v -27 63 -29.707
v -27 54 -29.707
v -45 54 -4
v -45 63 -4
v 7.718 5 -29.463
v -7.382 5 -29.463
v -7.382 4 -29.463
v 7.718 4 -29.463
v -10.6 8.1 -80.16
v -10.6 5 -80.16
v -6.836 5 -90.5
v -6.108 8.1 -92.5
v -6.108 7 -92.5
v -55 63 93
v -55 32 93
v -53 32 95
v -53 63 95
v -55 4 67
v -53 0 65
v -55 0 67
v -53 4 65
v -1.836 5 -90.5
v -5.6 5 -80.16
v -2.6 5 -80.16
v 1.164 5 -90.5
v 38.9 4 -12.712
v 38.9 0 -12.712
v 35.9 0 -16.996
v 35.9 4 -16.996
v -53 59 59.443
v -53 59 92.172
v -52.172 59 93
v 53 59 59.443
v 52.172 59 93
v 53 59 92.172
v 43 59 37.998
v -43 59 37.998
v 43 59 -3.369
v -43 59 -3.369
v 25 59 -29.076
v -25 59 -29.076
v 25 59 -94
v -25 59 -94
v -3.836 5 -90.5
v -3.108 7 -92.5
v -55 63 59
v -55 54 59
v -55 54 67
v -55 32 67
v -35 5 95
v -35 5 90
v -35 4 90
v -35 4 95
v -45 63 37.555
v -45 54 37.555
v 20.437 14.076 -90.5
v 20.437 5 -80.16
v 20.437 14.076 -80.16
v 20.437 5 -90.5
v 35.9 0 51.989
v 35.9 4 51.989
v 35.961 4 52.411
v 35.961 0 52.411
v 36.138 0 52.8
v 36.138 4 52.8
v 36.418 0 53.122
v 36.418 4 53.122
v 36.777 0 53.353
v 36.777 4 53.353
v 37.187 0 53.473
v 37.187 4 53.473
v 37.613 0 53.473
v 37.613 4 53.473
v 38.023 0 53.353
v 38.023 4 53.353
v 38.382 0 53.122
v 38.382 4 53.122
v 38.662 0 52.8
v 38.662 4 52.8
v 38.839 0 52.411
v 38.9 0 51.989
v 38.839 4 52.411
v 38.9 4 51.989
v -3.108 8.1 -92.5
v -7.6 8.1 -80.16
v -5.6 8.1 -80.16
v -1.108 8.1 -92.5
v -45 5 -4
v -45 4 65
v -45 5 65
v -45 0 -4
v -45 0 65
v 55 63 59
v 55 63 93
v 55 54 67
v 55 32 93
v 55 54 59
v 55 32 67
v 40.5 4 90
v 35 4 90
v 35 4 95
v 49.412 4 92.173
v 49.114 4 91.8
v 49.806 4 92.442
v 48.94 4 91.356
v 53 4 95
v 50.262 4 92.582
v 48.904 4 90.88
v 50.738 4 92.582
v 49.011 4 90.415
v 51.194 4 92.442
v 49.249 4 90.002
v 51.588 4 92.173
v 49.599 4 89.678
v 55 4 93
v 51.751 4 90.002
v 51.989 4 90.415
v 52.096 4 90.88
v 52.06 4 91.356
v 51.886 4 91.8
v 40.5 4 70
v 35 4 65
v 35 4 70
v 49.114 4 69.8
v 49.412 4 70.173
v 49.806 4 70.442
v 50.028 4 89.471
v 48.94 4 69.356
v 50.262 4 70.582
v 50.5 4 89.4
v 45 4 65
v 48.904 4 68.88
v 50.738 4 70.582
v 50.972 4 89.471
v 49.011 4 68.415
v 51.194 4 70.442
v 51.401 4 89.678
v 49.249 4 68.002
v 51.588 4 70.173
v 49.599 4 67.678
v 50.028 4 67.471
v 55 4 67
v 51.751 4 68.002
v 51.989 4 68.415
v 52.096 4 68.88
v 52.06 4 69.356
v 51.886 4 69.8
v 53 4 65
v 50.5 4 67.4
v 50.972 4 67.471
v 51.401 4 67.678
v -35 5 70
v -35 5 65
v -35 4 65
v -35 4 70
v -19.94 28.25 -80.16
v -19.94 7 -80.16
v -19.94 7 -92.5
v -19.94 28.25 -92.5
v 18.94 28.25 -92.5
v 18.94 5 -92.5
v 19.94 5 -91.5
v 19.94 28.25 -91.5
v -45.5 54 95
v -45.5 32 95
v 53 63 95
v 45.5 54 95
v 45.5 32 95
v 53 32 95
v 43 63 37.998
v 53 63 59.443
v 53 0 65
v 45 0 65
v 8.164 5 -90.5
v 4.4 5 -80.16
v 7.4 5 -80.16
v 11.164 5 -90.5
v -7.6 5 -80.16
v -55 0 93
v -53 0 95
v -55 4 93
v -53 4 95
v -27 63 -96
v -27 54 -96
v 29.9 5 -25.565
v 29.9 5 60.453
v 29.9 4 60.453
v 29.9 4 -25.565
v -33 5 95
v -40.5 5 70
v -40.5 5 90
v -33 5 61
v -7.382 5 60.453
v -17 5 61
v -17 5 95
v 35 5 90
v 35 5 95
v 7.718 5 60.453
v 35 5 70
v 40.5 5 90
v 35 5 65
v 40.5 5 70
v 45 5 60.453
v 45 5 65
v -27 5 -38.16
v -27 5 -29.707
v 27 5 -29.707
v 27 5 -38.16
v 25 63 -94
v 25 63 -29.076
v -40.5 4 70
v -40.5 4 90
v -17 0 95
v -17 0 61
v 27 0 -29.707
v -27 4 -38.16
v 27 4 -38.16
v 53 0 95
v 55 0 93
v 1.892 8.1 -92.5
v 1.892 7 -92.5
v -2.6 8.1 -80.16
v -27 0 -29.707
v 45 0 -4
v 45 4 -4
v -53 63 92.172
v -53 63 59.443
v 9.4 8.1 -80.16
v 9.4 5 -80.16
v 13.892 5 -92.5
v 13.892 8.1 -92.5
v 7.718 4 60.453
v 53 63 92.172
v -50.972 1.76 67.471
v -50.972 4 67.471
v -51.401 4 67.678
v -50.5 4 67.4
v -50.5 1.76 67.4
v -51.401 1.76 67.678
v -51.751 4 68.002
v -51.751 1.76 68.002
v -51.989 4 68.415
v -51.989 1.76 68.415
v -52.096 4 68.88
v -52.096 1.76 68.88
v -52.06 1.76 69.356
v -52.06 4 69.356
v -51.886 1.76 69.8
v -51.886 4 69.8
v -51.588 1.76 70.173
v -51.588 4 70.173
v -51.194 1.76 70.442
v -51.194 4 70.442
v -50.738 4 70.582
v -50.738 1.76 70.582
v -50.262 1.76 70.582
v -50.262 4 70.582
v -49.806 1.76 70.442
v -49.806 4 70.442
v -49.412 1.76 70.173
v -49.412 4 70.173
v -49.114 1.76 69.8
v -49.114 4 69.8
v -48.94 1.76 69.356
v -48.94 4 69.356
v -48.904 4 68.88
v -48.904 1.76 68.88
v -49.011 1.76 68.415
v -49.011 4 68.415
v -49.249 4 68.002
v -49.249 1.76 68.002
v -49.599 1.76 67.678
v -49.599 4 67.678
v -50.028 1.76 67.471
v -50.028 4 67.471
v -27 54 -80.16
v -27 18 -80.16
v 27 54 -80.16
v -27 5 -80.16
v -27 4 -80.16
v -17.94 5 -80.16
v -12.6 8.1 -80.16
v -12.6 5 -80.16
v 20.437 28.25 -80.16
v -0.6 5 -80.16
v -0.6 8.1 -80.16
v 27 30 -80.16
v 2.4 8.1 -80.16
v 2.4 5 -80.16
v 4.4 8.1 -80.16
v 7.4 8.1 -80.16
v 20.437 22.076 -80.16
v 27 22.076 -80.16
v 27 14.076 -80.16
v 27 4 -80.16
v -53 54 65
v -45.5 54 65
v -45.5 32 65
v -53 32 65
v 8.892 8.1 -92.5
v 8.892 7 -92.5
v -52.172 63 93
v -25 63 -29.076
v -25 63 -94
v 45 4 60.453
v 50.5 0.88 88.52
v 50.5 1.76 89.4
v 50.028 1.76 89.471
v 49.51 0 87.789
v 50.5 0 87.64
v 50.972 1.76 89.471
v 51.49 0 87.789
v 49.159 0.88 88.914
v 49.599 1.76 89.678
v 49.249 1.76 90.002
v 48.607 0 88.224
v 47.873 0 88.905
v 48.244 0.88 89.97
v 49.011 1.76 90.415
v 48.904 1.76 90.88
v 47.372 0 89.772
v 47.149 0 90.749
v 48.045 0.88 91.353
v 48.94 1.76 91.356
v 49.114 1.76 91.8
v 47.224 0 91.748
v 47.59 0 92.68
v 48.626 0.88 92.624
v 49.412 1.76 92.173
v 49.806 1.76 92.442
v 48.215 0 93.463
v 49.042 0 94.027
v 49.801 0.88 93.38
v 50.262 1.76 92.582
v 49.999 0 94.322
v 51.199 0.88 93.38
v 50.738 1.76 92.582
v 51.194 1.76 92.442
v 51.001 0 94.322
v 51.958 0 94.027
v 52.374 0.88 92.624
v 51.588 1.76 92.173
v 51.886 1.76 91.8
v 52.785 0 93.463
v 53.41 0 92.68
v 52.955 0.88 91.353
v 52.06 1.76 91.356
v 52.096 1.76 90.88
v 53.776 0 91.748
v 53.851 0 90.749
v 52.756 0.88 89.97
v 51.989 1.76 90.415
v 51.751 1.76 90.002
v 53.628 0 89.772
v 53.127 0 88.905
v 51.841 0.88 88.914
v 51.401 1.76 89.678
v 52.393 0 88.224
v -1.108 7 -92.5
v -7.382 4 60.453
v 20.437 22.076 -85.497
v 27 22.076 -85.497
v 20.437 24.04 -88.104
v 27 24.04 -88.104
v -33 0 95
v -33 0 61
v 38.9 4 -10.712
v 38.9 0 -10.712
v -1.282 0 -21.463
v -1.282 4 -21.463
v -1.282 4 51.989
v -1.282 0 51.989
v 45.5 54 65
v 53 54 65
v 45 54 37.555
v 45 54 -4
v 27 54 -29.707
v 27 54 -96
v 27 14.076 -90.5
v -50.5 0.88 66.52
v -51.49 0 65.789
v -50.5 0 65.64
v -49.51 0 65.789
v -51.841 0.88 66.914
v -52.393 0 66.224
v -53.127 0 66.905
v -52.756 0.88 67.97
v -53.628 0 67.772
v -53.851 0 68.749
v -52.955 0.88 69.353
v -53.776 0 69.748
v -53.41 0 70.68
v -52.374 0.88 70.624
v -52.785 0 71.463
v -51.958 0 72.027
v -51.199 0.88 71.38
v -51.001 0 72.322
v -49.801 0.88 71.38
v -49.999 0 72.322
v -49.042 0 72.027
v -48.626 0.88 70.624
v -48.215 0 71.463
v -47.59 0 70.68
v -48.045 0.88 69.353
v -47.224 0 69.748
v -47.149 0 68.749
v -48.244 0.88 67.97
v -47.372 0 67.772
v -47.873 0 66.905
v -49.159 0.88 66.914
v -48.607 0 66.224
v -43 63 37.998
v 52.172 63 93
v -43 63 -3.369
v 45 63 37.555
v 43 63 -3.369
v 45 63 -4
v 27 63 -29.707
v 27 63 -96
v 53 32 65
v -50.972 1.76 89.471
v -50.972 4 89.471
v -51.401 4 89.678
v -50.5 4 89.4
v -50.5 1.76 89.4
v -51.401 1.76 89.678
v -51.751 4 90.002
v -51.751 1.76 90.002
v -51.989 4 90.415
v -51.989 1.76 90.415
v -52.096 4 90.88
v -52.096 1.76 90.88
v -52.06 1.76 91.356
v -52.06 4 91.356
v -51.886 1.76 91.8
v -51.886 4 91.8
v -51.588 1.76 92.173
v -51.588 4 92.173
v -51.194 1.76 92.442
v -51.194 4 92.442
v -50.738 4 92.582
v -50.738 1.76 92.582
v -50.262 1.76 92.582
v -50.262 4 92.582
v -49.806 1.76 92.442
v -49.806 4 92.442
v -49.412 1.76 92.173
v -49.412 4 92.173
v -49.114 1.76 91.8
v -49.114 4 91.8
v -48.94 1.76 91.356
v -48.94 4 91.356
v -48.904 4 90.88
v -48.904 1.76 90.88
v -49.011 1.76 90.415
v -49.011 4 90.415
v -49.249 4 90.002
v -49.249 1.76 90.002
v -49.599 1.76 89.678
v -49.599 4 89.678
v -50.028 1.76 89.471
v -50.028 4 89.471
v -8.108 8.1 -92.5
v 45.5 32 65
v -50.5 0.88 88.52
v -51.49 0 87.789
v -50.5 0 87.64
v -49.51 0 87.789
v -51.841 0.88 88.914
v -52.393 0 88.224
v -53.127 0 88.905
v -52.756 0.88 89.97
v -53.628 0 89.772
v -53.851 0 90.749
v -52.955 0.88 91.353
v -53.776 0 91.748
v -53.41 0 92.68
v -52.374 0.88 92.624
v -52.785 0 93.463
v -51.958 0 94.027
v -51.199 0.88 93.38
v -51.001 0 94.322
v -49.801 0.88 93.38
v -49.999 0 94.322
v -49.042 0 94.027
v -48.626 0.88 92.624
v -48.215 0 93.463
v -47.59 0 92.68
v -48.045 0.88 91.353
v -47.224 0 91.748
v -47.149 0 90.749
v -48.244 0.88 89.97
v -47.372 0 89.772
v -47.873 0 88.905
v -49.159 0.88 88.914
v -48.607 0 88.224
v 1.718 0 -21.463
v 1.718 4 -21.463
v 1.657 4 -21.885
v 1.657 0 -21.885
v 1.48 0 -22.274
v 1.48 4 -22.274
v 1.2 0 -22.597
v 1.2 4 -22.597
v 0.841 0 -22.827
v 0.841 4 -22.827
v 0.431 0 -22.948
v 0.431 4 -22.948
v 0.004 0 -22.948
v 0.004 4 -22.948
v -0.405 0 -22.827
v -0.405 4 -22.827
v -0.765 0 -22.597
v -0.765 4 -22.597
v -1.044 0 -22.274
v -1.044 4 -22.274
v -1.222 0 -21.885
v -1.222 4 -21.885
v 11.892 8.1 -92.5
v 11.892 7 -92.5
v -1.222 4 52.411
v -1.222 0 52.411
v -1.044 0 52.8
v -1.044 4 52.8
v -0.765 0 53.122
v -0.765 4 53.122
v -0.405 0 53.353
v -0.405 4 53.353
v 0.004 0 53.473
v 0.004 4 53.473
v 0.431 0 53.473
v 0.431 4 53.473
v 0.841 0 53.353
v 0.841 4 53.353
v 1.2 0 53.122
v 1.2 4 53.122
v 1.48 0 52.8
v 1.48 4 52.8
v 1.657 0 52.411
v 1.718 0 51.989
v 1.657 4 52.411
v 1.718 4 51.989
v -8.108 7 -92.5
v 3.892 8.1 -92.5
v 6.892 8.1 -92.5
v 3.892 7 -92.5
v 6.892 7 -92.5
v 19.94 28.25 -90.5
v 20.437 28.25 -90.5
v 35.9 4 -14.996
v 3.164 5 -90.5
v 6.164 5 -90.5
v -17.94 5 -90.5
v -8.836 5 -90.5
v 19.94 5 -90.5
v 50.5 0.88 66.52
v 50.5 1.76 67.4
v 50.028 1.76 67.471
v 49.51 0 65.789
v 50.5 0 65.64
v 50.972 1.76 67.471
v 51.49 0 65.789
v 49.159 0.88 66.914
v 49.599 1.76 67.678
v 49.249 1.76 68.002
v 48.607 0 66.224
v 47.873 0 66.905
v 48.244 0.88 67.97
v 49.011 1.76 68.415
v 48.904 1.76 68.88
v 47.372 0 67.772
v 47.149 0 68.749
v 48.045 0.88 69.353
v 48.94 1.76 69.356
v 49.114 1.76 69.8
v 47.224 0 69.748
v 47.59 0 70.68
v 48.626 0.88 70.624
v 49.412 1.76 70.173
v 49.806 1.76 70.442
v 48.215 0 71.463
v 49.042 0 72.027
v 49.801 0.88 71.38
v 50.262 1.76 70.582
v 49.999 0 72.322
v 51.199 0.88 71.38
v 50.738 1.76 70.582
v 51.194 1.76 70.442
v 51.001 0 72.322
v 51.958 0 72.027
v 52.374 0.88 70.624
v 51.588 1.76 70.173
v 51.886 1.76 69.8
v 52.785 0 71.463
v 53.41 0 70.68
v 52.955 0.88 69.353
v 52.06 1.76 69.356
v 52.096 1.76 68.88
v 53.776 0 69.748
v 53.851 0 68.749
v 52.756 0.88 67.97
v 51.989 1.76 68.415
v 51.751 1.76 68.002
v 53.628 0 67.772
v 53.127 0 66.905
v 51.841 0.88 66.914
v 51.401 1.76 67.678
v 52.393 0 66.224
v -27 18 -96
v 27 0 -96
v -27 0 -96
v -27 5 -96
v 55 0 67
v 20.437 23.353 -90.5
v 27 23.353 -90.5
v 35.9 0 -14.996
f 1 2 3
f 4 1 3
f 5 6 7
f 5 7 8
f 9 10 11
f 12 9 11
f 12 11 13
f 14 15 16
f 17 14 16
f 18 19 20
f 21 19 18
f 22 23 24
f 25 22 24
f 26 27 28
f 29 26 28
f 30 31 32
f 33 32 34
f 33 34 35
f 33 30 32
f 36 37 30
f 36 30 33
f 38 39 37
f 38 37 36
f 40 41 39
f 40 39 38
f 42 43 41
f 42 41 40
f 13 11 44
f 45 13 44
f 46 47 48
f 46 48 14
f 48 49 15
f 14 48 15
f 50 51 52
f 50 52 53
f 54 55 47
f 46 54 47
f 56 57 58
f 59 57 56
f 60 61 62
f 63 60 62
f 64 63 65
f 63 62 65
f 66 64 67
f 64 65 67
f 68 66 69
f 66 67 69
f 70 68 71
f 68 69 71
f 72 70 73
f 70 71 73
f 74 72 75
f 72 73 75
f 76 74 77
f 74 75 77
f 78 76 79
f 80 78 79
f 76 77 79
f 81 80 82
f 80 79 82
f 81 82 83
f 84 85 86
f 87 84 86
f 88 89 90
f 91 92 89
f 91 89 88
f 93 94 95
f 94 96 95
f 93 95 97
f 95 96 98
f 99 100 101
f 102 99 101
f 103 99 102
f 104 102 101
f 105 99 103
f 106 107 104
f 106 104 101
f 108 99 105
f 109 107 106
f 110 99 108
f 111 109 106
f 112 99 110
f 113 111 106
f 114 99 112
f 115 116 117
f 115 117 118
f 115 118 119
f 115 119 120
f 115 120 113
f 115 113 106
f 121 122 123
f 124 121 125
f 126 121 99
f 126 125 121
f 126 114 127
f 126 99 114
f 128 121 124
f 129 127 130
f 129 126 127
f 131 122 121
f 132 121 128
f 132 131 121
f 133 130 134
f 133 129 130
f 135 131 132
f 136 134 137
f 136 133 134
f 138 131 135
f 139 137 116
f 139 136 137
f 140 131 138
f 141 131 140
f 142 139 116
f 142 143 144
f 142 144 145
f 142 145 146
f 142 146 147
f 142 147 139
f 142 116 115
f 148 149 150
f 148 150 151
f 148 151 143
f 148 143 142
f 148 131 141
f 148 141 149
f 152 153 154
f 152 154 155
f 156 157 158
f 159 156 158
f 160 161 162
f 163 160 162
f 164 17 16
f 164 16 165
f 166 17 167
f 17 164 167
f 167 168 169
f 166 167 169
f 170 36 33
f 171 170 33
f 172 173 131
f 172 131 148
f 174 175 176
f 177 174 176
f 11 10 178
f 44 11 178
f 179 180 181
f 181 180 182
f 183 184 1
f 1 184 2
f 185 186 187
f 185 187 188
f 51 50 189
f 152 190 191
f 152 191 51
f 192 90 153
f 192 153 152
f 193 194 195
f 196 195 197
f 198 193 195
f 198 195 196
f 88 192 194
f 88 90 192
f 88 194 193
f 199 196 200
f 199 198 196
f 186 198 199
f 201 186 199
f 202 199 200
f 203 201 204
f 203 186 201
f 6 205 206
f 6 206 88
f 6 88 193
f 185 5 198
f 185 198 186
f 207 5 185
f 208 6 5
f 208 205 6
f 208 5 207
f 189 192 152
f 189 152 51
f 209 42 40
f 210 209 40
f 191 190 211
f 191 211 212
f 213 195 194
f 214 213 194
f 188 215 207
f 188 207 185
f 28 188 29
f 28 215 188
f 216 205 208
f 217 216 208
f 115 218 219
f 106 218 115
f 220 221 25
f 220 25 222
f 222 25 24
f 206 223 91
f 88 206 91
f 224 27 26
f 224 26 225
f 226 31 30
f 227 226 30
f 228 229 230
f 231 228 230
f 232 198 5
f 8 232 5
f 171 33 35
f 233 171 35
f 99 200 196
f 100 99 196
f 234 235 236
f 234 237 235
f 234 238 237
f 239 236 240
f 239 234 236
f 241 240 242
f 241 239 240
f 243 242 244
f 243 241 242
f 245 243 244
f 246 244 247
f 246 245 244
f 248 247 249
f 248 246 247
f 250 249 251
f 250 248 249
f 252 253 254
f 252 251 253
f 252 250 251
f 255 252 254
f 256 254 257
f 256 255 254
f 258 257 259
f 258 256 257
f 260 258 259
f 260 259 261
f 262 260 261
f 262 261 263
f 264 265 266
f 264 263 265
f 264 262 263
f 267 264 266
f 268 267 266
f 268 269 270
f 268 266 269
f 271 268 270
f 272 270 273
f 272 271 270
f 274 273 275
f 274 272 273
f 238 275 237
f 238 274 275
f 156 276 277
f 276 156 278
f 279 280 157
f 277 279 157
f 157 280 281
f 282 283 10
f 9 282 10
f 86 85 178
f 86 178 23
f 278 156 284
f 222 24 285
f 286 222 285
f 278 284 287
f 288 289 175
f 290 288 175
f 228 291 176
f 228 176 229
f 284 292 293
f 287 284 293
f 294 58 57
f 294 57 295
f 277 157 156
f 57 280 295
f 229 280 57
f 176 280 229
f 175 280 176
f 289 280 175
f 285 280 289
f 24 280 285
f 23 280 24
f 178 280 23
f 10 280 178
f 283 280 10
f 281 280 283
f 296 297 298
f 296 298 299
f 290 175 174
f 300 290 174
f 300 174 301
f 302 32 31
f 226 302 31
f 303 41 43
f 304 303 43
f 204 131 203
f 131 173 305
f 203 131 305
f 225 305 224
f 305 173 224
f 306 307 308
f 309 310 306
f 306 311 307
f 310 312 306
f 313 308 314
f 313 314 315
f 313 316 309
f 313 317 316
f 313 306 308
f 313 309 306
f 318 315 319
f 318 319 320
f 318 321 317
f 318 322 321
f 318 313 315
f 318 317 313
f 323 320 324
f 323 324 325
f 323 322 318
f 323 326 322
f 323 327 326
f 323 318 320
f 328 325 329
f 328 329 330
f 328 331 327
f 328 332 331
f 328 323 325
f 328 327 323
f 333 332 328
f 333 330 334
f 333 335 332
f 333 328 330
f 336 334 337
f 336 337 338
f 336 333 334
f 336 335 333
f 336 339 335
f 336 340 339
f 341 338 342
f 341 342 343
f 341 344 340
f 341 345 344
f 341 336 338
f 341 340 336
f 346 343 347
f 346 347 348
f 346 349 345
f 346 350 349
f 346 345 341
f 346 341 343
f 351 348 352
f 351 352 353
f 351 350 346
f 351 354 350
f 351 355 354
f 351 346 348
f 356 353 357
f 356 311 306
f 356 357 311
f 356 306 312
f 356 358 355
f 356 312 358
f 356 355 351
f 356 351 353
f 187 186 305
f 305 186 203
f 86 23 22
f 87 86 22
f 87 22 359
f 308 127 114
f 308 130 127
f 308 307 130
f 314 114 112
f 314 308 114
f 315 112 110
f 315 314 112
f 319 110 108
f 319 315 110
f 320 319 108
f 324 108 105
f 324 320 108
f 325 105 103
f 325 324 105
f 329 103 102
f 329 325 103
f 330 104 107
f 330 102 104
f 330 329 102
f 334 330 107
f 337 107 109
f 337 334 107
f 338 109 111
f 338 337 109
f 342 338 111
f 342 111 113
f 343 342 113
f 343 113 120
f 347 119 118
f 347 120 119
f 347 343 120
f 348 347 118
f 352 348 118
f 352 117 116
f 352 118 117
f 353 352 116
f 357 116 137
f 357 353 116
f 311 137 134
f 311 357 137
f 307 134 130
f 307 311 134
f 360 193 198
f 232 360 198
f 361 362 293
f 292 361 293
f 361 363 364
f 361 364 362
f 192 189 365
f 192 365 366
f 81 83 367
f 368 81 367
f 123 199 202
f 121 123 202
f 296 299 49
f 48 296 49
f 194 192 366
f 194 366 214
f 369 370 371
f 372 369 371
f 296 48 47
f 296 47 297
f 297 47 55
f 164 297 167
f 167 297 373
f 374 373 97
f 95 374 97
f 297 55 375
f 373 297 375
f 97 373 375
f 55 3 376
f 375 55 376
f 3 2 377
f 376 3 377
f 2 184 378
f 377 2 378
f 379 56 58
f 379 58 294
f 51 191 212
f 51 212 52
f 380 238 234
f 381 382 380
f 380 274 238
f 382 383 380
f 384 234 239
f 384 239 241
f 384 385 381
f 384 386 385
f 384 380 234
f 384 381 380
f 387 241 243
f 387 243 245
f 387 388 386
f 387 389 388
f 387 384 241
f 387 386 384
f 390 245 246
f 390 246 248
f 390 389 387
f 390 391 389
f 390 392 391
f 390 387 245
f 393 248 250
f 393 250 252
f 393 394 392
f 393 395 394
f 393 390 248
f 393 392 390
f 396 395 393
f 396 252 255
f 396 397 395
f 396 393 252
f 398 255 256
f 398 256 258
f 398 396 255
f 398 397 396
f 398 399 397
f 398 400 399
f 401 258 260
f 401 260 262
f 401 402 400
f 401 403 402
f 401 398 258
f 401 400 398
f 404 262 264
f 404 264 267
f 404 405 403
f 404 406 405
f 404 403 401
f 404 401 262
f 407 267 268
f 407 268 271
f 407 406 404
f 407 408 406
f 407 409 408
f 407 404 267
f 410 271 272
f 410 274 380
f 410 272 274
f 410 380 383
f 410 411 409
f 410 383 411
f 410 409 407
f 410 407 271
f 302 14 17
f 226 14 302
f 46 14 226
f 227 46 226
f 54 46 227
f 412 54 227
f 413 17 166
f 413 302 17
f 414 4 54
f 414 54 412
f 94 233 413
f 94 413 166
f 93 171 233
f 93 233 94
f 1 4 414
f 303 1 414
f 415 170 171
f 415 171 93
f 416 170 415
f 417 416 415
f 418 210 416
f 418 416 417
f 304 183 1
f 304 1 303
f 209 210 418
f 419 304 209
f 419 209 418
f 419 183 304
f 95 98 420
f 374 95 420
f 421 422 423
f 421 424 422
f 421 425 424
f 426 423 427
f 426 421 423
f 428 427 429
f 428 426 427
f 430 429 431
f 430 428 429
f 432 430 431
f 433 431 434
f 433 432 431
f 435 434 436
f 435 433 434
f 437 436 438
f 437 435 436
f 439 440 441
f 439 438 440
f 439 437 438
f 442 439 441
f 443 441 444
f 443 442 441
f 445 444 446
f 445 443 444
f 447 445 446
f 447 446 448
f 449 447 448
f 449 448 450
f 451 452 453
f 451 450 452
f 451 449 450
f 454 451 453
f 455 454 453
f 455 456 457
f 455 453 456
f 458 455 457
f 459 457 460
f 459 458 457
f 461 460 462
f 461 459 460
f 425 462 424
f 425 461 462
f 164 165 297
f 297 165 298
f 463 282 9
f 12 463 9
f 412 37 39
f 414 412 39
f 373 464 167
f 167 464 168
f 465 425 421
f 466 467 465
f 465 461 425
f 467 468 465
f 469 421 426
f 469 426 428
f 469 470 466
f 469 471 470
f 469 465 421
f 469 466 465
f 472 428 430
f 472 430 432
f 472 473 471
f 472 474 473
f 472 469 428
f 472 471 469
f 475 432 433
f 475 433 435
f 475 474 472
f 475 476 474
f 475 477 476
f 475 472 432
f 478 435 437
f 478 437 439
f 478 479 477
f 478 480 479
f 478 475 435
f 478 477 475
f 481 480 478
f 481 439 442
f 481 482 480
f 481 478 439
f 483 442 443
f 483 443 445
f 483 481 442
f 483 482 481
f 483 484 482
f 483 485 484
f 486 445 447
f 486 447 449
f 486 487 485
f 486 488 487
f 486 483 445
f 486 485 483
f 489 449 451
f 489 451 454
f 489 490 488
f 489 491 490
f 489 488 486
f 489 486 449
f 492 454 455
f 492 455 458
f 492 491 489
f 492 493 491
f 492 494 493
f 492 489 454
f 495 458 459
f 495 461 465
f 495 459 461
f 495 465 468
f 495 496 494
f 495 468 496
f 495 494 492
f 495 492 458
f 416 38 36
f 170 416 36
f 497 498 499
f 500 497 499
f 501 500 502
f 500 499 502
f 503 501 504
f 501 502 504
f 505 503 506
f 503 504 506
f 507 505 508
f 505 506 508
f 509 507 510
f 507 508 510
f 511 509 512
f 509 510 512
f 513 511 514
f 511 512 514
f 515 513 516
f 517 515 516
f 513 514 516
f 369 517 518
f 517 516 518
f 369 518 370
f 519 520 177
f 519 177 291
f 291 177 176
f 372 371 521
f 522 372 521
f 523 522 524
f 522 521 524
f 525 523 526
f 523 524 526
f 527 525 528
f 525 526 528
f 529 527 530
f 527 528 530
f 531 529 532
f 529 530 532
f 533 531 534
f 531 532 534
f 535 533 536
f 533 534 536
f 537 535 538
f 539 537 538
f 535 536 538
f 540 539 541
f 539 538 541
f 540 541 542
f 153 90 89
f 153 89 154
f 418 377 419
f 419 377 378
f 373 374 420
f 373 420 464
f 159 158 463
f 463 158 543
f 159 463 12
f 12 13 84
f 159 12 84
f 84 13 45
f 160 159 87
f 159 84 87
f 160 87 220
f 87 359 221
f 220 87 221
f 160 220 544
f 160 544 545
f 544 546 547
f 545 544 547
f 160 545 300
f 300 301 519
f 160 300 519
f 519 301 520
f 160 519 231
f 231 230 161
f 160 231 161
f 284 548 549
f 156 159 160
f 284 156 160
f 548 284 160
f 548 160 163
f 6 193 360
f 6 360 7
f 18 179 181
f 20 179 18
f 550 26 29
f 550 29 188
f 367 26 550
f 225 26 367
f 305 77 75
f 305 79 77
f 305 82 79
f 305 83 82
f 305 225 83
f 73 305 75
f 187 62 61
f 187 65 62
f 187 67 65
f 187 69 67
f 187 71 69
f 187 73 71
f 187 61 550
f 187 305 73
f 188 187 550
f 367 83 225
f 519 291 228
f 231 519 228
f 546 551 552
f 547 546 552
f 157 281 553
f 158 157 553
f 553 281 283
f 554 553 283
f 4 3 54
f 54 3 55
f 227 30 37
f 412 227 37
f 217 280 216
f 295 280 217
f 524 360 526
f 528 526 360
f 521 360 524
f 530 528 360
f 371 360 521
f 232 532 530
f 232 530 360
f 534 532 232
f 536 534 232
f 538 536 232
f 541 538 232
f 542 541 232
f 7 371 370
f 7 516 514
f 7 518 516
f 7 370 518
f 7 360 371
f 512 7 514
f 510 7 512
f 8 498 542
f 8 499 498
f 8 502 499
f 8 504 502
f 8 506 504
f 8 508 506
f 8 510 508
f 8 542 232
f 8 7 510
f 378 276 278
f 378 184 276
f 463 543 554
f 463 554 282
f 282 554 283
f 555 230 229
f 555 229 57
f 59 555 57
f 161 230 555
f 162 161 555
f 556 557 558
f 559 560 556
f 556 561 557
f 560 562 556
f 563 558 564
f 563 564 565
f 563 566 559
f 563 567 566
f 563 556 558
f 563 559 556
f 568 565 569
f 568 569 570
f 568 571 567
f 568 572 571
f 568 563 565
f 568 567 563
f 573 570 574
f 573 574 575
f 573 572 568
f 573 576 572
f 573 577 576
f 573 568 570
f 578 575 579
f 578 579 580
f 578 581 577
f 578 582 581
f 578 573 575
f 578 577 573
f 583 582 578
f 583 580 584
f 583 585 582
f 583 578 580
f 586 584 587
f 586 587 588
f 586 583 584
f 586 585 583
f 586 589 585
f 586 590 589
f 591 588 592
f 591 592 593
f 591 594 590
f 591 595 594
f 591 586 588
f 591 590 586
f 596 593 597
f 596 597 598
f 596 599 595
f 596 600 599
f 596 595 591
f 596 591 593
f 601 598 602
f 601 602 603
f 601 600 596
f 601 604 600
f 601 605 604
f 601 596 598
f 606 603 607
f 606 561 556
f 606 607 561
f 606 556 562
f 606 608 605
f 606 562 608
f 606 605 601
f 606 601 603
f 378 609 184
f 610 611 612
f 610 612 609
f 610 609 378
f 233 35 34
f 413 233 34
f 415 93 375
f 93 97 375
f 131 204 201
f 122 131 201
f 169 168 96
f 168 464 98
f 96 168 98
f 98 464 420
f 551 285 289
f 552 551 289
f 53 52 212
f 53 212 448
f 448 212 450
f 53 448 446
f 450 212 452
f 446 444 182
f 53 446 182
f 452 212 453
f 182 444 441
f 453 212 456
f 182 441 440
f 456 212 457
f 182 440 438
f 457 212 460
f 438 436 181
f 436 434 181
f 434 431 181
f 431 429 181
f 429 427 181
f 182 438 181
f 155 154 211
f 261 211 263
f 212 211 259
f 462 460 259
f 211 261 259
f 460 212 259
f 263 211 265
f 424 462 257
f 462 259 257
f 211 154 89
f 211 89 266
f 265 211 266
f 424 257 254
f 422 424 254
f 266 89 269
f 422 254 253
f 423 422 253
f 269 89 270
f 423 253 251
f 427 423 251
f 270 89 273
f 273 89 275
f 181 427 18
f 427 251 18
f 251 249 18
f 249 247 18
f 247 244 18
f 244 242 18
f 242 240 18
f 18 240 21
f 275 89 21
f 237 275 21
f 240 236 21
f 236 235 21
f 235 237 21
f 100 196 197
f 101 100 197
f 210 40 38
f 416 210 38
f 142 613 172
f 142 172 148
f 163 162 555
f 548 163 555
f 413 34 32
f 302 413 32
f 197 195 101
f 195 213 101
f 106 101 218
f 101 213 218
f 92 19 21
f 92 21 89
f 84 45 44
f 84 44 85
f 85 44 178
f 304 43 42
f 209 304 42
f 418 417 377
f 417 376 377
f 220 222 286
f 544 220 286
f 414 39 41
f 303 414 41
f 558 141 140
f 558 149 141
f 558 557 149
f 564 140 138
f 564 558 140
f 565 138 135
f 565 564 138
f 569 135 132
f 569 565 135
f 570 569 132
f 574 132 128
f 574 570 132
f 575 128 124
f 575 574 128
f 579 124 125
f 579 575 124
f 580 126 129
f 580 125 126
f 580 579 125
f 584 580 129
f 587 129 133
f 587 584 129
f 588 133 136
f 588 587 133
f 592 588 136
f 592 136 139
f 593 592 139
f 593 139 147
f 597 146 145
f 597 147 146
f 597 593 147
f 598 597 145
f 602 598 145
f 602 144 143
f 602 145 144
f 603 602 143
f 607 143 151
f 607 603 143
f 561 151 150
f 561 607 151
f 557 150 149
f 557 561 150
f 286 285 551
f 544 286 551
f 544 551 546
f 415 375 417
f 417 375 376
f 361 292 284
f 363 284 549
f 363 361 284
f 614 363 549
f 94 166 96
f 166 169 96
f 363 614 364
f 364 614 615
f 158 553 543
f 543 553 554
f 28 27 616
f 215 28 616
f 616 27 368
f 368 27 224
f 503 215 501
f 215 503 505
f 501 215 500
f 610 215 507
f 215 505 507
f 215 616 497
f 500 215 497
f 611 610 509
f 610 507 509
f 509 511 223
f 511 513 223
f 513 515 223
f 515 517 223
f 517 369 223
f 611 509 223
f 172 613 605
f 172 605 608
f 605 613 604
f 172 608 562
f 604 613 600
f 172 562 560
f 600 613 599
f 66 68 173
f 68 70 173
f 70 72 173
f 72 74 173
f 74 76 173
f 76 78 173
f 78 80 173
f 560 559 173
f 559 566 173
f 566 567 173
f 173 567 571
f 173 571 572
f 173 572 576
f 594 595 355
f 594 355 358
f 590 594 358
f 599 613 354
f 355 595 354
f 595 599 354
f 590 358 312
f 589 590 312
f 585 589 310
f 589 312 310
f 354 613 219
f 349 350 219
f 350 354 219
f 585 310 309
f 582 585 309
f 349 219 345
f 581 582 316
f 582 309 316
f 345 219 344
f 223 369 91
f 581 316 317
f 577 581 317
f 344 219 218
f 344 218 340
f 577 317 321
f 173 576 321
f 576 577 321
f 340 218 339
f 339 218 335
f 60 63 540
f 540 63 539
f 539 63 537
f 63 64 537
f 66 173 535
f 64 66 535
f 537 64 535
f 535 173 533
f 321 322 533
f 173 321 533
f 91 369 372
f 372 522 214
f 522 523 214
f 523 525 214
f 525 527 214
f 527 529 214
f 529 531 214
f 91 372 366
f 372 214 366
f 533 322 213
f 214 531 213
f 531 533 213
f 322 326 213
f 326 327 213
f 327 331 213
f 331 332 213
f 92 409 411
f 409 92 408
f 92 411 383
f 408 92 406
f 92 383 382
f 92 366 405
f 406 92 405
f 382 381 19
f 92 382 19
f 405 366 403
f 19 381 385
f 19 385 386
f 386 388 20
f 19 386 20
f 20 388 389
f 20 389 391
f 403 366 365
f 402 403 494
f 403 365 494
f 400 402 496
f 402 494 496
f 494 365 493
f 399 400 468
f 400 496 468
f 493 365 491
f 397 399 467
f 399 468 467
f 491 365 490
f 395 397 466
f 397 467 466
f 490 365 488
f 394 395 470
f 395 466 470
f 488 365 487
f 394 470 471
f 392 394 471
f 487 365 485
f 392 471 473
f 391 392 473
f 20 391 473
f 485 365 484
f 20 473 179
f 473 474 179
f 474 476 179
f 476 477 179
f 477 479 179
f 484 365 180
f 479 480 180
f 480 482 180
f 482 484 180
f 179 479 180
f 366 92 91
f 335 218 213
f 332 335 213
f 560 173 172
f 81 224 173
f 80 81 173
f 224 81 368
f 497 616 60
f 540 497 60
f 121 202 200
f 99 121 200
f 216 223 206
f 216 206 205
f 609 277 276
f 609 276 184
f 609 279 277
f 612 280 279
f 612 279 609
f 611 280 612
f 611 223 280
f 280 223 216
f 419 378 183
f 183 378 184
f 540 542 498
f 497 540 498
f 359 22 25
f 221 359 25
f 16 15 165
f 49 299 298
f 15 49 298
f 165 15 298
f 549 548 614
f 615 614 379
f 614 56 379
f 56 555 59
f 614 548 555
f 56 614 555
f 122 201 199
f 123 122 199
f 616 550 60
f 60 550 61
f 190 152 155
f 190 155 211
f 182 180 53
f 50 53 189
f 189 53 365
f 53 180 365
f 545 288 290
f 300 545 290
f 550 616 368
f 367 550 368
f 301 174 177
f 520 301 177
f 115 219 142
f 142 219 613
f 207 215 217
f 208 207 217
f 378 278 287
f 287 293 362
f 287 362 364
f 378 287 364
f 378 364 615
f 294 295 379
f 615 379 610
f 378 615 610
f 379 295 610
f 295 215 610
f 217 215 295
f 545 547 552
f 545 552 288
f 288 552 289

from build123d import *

# Parameters (mm, degrees)
SKETCH1_W                    = 90
SKETCH1_H                    = 190
BOSS_EXTRUDE1_DEPTH          = 5
SKETCH2_W                    = 10
SKETCH2_H                    = 30
BOSS_EXTRUDE2_DEPTH          = 5
CHAMFER1_SIZE                = 2
SKETCH3_W                    = 16
SKETCH3_H                    = 34
CUT_EXTRUDE1_DEPTH           = 50
SKETCH4_W                    = 90
SKETCH4_H                    = 42
CUT_EXTRUDE2_DEPTH           = 1
SKETCH7_W                    = 15.1
SKETCH7_H                    = 89.916335477
CUT_EXTRUDE7_DEPTH           = 1
BOSS_EXTRUDE4_START          = 5
BOSS_EXTRUDE4_DEPTH          = 13
BOSS_EXTRUDE5_DEPTH          = 3.1
CUT_EXTRUDE11_START          = 5
CUT_EXTRUDE11_DEPTH          = 1
CUT_EXTRUDE12_DEPTH          = 112.23848255
CUT_EXTRUDE12_DEPTH_BACK     = 112.23848255
BOSS_EXTRUDE6_DEPTH          = 1
CHAMFER4_SIZE                = 2
CUT_EXTRUDE13_REACH          = 114.094
SKETCH23_R                   = 1.5
CUT_EXTRUDE14_DEPTH          = 113.093556715
CUT_EXTRUDE14_DEPTH_BACK     = 113.093556715
SKETCH27_W                   = 2.002698481
SKETCH27_H                   = 10.340179912
BOSS_EXTRUDE7_DEPTH          = 8
BOSS_EXTRUDE10_DEPTH         = 8
BOSS_EXTRUDE11_OUTLINE_W     = 4.559976017
BOSS_EXTRUDE11_OUTLINE_H     = 15.84
BOSS_EXTRUDE11_DEPTH         = 13
BOSS_EXTRUDE12_DEPTH         = 12
SKETCH34_W                   = 46.940023983
SKETCH34_H                   = 1.75
BOSS_EXTRUDE13_DEPTH         = 12.34
SKETCH35_W                   = 6.562674498
SKETCH35_H                   = 5.170089956
BOSS_EXTRUDE14_DEPTH         = 15.25
SKETCH36_W                   = 6.562674498
SKETCH36_H                   = 8
CUT_EXTRUDE15_DEPTH          = 5.170089956
CHAMFER5_SIZE                = 8.360382376
CHAMFER5_SIZE_2              = 6.3
CHAMFER6_SIZE                = 3
CHAMFER6_SIZE2               = 2.492460212
SKETCH37_W                   = 6.562674498
SKETCH37_H                   = 5.170089956
BOSS_EXTRUDE15_DEPTH         = 1.075733433
BOSS_EXTRUDE16_START         = 24
BOSS_EXTRUDE16_DEPTH         = 5
BOSS_EXTRUDE17_DEPTH         = 4
SKETCH40_W                   = 54
SKETCH40_H                   = 15.84
BOSS_EXTRUDE18_DEPTH         = 24
BOSS_EXTRUDE19_START         = 32
BOSS_EXTRUDE19_DEPTH         = 22
SPLIT1_START                 = 54
SPLIT1_DEPTH                 = 5
SPLIT1_START_2               = 32
SPLIT1_2_DEPTH               = 22
SPLIT1_START_3               = 59
SPLIT1_3_DEPTH               = 4
SPLIT1_4_DEPTH               = 9
SPLIT1_5_DEPTH               = 22
BOSS_EXTRUDE20_DEPTH         = 4
CSK_FOR_M3_SFHCS1_AT_2_COUNT = 2
CSK_FOR_M3_SFHCS1_AT_2_PITCH = 22
CSK_FOR_M3_SFHCS1_AT_3_COUNT = 2
CSK_FOR_M3_SFHCS1_AT_3_PITCH = 103.368273663
CSK_FOR_M3_SFHCS1_AT_4_COUNT = 2
CSK_FOR_M3_SFHCS1_AT_4_PITCH = 101


# Read off the part's stored shape, not the designer's step: Boss-Extrude11, Split1
with BuildPart() as part:
    # Sketch1 → Boss-Extrude1 (new body)
    with BuildSketch(Plane(origin=(0, 0, 0), x_dir=(1, 0, 0), z_dir=(0, 1, 0))):
        Rectangle(SKETCH1_W, SKETCH1_H)
    extrude(amount=BOSS_EXTRUDE1_DEPTH)

    # Sketch2 → Boss-Extrude2 (add)
    with BuildSketch(Plane(origin=(0, 0, 0), x_dir=(1, 0, 0), z_dir=(0, 1, 0))):
        with Locations((-50, -80)):
            Rectangle(SKETCH2_W, SKETCH2_H)
        with Locations((50, -80)):
            Rectangle(SKETCH2_W, SKETCH2_H)
    extrude(amount=BOSS_EXTRUDE2_DEPTH)

    # Chamfer1
    chamfer1_edges = [part.edges().sort_by_distance(p)[0] for p in [
        (-55, 2.5, 65),
        (-55, 2.5, 95),
        (55, 2.5, 95),
        (55, 2.5, 65),
    ]]
    chamfer(chamfer1_edges, length=CHAMFER1_SIZE)

    # Sketch3 → Cut-Extrude1 (cut)
    with BuildSketch(Plane(origin=(0, 5, 0), x_dir=(1, 0, 0), z_dir=(0, 1, 0))):
        with Locations((-25, -78)):
            Rectangle(SKETCH3_W, SKETCH3_H)
    extrude(amount=-CUT_EXTRUDE1_DEPTH, mode=Mode.SUBTRACT)

    # Sketch4 → Cut-Extrude2 (cut)
    with BuildSketch(Plane(origin=(0, 5, 0), x_dir=(1, 0, 0), z_dir=(0, 1, 0))):
        with Locations((0, 59.159820088)):
            Rectangle(SKETCH4_W, SKETCH4_H)
    extrude(amount=-CUT_EXTRUDE2_DEPTH, mode=Mode.SUBTRACT)

    # Sketch7 → Cut-Extrude7 (cut)
    with BuildSketch(Plane(origin=(0, 5, 0), x_dir=(1, 0, 0), z_dir=(0, 1, 0))):
        with Locations((37.45, -15.495273531)):
            Rectangle(SKETCH7_W, SKETCH7_H)
        with Locations((0.16773297, -15.495273531)):
            Rectangle(SKETCH7_W, SKETCH7_H)
    extrude(amount=-CUT_EXTRUDE7_DEPTH, mode=Mode.SUBTRACT)

    # Sketch17 → Boss-Extrude4 (add)
    with BuildSketch(Plane(origin=(0, 0, 0), x_dir=(1, 0, 0), z_dir=(0, 1, 0)).offset(BOSS_EXTRUDE4_START)):
        Polygon((-22.440023983, 80.159820088), (-19.940023983, 80.159820088), (-19.940023983, 92.499820088), (18.940023983, 92.499820088), (19.940023983, 91.499820088), (19.940023983, 90.5), (22.440023983, 90.5), (22.440023983, 92.535353994), (19.975557889, 94.999820088), (-22.440023983, 94.999820088), align=None)
    extrude(amount=BOSS_EXTRUDE4_DEPTH)

    # Sketch18 → Boss-Extrude5 (add)
    with BuildSketch(Plane(origin=(0, 5, 0), x_dir=(1, 0, 0), z_dir=(0, 1, 0))):
        Polygon((-12.599634528, 80.159820088), (-10.599634528, 80.159820088), (-6.108241837, 92.499820088), (-8.108241837, 92.499820088), align=None)
        Polygon((-3.108241837, 92.499820088), (-7.599634528, 80.159820088), (-5.599634528, 80.159820088), (-1.108241837, 92.499820088), align=None)
        Polygon((1.891758163, 92.499820088), (-2.599634528, 80.159820088), (-0.599634528, 80.159820088), (3.891758163, 92.499820088), align=None)
        Polygon((6.891758163, 92.499820088), (2.400365472, 80.159820088), (4.400365472, 80.159820088), (8.891758163, 92.499820088), align=None)
        Polygon((11.891758163, 92.499820088), (7.400365472, 80.159820088), (9.400365472, 80.159820088), (13.891758163, 92.499820088), align=None)
    extrude(amount=BOSS_EXTRUDE5_DEPTH)

    # Sketch19 → Cut-Extrude11 (cut)
    with BuildSketch(Plane(origin=(0, 0, 0), x_dir=(1, 0, 0), z_dir=(0, 1, 0)).offset(CUT_EXTRUDE11_START)):
        Polygon((-35, -65), (-35, -70), (-40.5, -70), (-40.5, -90), (-35, -90), (-35, -95), (-53, -95), (-55, -93), (-55, -67), (-53, -65), align=None)
    cut_extrude11 = extrude(amount=-CUT_EXTRUDE11_DEPTH, mode=Mode.SUBTRACT)

    # Mirror1: Cut-Extrude11 across plane
    add(cut_extrude11.mirror(Plane(origin=(0, 0, 0), x_dir=(0, 0, 1), z_dir=(1, 0, 0))), mode=Mode.SUBTRACT)

    # Sketch20 → Cut-Extrude12 (cut, two sides: drawn at the far end of the back side and taken through both)
    with BuildSketch(Plane(origin=(0, 0, 0), x_dir=(1, 0, 0), z_dir=(0, 1, 0)).offset(-CUT_EXTRUDE12_DEPTH_BACK)):
        Polygon((-27, 29.706664121), (-45, 4), (-45, 95), (-27, 95), align=None)
        Polygon((27, 95), (27, 29.706664121), (45, 4), (45, 95), align=None)
    extrude(amount=CUT_EXTRUDE12_DEPTH + CUT_EXTRUDE12_DEPTH_BACK, mode=Mode.SUBTRACT)

    # Sketch22 → Boss-Extrude6 (add)
    with BuildSketch(Plane(origin=(0, 0, -94.999820088), x_dir=(-1, 0, 0), z_dir=(0, 0, -1))):
        Polygon((-19.975557889, 5), (-27, 5), (-27, 0), (27, 0), (27, 5), (22.440023983, 5), (22.440023983, 18), (-19.975557889, 18), align=None)
    extrude(amount=BOSS_EXTRUDE6_DEPTH)

    # Chamfer4
    chamfer4_edges = [part.edges().sort_by_distance(p)[0] for p in [
        (-19.940023983, 5, -86.329820088),
        (-14.02413291, 5, -92.499820088),
        (-4.608241837, 5, -92.499820088),
        (0.391758163, 5, -92.499820088),
        (5.391758163, 5, -92.499820088),
        (10.391758163, 5, -92.499820088),
    ]]
    chamfer(chamfer4_edges, length=CHAMFER4_SIZE)

    # Sketch23 → Cut-Extrude13 (cut, up to next)
    with BuildSketch(Plane.XZ, mode=Mode.PRIVATE) as cut_extrude13_sk1:
        with Locations(Location((-50.5, 91, 0), (0, 0, 270))):
            Circle(SKETCH23_R)
    cut_extrude13_tool1 = extrude(cut_extrude13_sk1.sketch, amount=-CUT_EXTRUDE13_REACH, mode=Mode.PRIVATE) & part.part
    # Sketch23 → Cut-Extrude13 (cut, up to next)
    with BuildSketch(Plane.XZ, mode=Mode.PRIVATE) as cut_extrude13_sk2:
        with Locations(Location((-50.5, 69, 0), (0, 0, 270))):
            Circle(SKETCH23_R)
    cut_extrude13_tool2 = extrude(cut_extrude13_sk2.sketch, amount=-CUT_EXTRUDE13_REACH, mode=Mode.PRIVATE) & part.part
    # Sketch23 → Cut-Extrude13 (cut, up to next)
    with BuildSketch(Plane.XZ, mode=Mode.PRIVATE) as cut_extrude13_sk3:
        with Locations(Location((50.5, 69, 0), (0, 0, 270))):
            Circle(SKETCH23_R)
    cut_extrude13_tool3 = extrude(cut_extrude13_sk3.sketch, amount=-CUT_EXTRUDE13_REACH, mode=Mode.PRIVATE) & part.part
    # Sketch23 → Cut-Extrude13 (cut, up to next)
    with BuildSketch(Plane.XZ, mode=Mode.PRIVATE) as cut_extrude13_sk4:
        with Locations(Location((50.5, 91, 0), (0, 0, 270))):
            Circle(SKETCH23_R)
    cut_extrude13_tool4 = extrude(cut_extrude13_sk4.sketch, amount=-CUT_EXTRUDE13_REACH, mode=Mode.PRIVATE) & part.part
    add(cut_extrude13_tool1.solids().sort_by_distance((-50.5, 0, 91))[0], mode=Mode.SUBTRACT)
    add(cut_extrude13_tool2.solids().sort_by_distance((-50.5, 0, 69))[0], mode=Mode.SUBTRACT)
    add(cut_extrude13_tool3.solids().sort_by_distance((50.5, 0, 69))[0], mode=Mode.SUBTRACT)
    add(cut_extrude13_tool4.solids().sort_by_distance((50.5, 0, 91))[0], mode=Mode.SUBTRACT)

    # Sketch25 → Cut-Extrude14 (cut, two sides: drawn at the far end of the back side and taken through both)
    with BuildSketch(Plane.XZ.offset(-CUT_EXTRUDE14_DEPTH_BACK)):
        with BuildLine():
            Line((1.71773297, 51.988728589), (1.71773297, -21.462894208))
            ThreePointArc((1.71773297, -21.462894208), (0.21773297, -22.962894208), (-1.28226703, -21.462894208))
            Line((-1.28226703, -21.462894208), (-1.28226703, 51.988728589))
            ThreePointArc((-1.28226703, 51.988728589), (0.21773297, 53.488728589), (1.71773297, 51.988728589))
        make_face()
        with BuildLine():
            Line((38.9, 51.988728589), (38.9, -21.462894208))
            ThreePointArc((38.9, -21.462894208), (37.4, -22.962894208), (35.9, -21.462894208))
            Line((35.9, -21.462894208), (35.9, 51.988728589))
            ThreePointArc((35.9, 51.988728589), (37.4, 53.488728589), (38.9, 51.988728589))
        make_face()
    extrude(amount=CUT_EXTRUDE14_DEPTH + CUT_EXTRUDE14_DEPTH_BACK, mode=Mode.SUBTRACT)

    # Sketch27 → Boss-Extrude7 (add)
    with BuildSketch(Plane(origin=(0, 5, 0), x_dir=(1, 0, 0), z_dir=(0, 1, 0))):
        with Locations((21.438674742, 85.329910044)):
            Rectangle(SKETCH27_W, SKETCH27_H)
    extrude(amount=BOSS_EXTRUDE7_DEPTH)

    # Sketch31 → Boss-Extrude10 (add)
    with BuildSketch(Plane(origin=(0, 5, 0), x_dir=(1, 0, 0), z_dir=(0, 1, 0))):
        Polygon((22.440023983, 92.535353994), (22.440023983, 80.159820088), (27, 80.159820088), (27, 95.999820088), (19.975557889, 95.999820088), (19.975557889, 94.999820088), align=None)
    extrude(amount=BOSS_EXTRUDE10_DEPTH)

    # Boss-Extrude11 outline → Boss-Extrude11 (add)
    with BuildSketch(Plane(origin=(0, 5, 0), x_dir=(1, 0, 0), z_dir=(0, 1, 0))):
        Polygon((22.440023983, 90.5), (27, 90.5), (27, 95.999820088), (19.975557889, 95.999820088), (19.975557889, 94.999820088), (22.440023983, 92.535353994), align=None)
        with Locations((-24.720011992, 88.079820088)):
            Rectangle(BOSS_EXTRUDE11_OUTLINE_W, BOSS_EXTRUDE11_OUTLINE_H)
    extrude(amount=BOSS_EXTRUDE11_DEPTH)

    # Sketch33 → Boss-Extrude12 (add)
    with BuildSketch(Plane(origin=(0, 18, 0), x_dir=(1, 0, 0), z_dir=(0, 1, 0))):
        Polygon((19.940023983, 90.5), (27, 90.5), (27, 95.999820088), (-27, 95.999820088), (-27, 80.159820088), (-19.940023983, 80.159820088), (-19.940023983, 92.499820088), (18.940023983, 92.499820088), (19.940023983, 91.499820088), align=None)
    extrude(amount=BOSS_EXTRUDE12_DEPTH)

    # Sketch34 → Boss-Extrude13 (add)
    with BuildSketch(Plane.XY.offset(-92.499820088)):
        with Locations((3.529988009, 29.125)):
            Rectangle(SKETCH34_W, SKETCH34_H)
    extrude(amount=BOSS_EXTRUDE13_DEPTH)

    # Sketch35 → Boss-Extrude14 (add)
    with BuildSketch(Plane(origin=(0, 13, 0), x_dir=(1, 0, 0), z_dir=(0, 1, 0))):
        with Locations((23.718662751, 82.744865066)):
            Rectangle(SKETCH35_W, SKETCH35_H)
    extrude(amount=BOSS_EXTRUDE14_DEPTH)

    # Sketch36 → Cut-Extrude15 (cut)
    with BuildSketch(Plane.XY.offset(-80.159820088)):
        with Locations((23.718662751, 18.075733433)):
            Rectangle(SKETCH36_W, SKETCH36_H)
    extrude(amount=-CUT_EXTRUDE15_DEPTH, mode=Mode.SUBTRACT)

    # Chamfer5
    # the kernel refuses this chamfer: 8.360382376, 6.3 mm, written as the material it adds along each edge
    with BuildSketch(Plane(origin=(27, 28.25, -85.329910044), x_dir=(0, 0.023321052992756976, -0.9997280272590685), z_dir=(-1, 0, 0))) as chamfer5_piece_1_section:
        Polygon((CHAMFER5_SIZE * 0.999728027284, CHAMFER5_SIZE * 0.0233210529933), (-CHAMFER5_SIZE_2 * 0.0233210529928, CHAMFER5_SIZE_2 * 0.999728027259), (0, 0), align=None)
    chamfer5_piece_1 = extrude(amount=6.562674498, mode=Mode.PRIVATE)
    chamfer5_piece_1 = split(chamfer5_piece_1, bisect_by=Plane(origin=(25.118661311, 22.075733433, -88.202521449), z_dir=(0, 1, 0)), keep=Keep.TOP, mode=Mode.PRIVATE)
    add(chamfer5_piece_1)

    # Chamfer6
    chamfer6_edges = [part.edges().sort_by_distance(p)[0] for p in [
        (23.718662751, 25.845942226, -90.5),
    ]]
    chamfer6_side = [part.faces().sort_by_distance(p)[0] for p in [
        (23.718662751, 23.960837829, -87.998381973),
    ]]
    chamfer(chamfer6_edges, length=CHAMFER6_SIZE, length2=CHAMFER6_SIZE2, reference=chamfer6_side[0])

    # Sketch37 → Boss-Extrude15 (add)
    with BuildSketch(Plane(origin=(0, 13, 0), x_dir=(1, 0, 0), z_dir=(0, 1, 0))):
        with Locations((23.718662751, 87.914955022)):
            Rectangle(SKETCH37_W, SKETCH37_H)
    extrude(amount=BOSS_EXTRUDE15_DEPTH)



with BuildPart() as body_2:
    # Sketch38 → Boss-Extrude16 (new body)
    with BuildSketch(Plane(origin=(0, 30, 0), x_dir=(1, 0, 0), z_dir=(0, 1, 0)).offset(BOSS_EXTRUDE16_START)):
        Polygon((-55, -59), (-55, -93), (-53, -95), (53, -95), (55, -93), (55, -59), (45, -37.554930795), (45, 4), (27, 29.706664121), (27, 95.999820088), (-27, 95.999820088), (-27, 29.706664121), (-45, 4), (-45, -37.554930795), align=None)
    extrude(amount=BOSS_EXTRUDE16_DEPTH)

    # Sketch39 → Boss-Extrude17 (add)
    with BuildSketch(Plane(origin=(0, 59, 0), x_dir=(1, 0, 0), z_dir=(0, 1, 0))):
        Polygon((55, -59), (45, -37.554930795), (45, 4), (27, 29.706664121), (27, 95.999820088), (-27, 95.999820088), (-27, 29.706664121), (-45, 4), (-45, -37.554930795), (-55, -59), (-55, -93), (-53, -95), (53, -95), (55, -93), align=None)
        Polygon((-43, -37.99832012), (-53, -59.443389325), (-53, -92.171572875), (-52.171572875, -93), (52.171572875, -93), (53, -92.171572875), (53, -59.443389325), (43, -37.99832012), (43, 3.369402422), (25, 29.076066544), (25, 93.999820088), (-25, 93.999820088), (-25, 29.076066544), (-43, 3.369402422), align=None, mode=Mode.SUBTRACT)
    extrude(amount=BOSS_EXTRUDE17_DEPTH)


with BuildPart() as part_1:
    add(part.part)

    add(body_2.part)  # Boss-Extrude18 merges body 2
    # Sketch40 → Boss-Extrude18 (add)
    with BuildSketch(Plane(origin=(0, 30, 0), x_dir=(1, 0, 0), z_dir=(0, 1, 0))):
        with Locations((0, 88.079820088)):
            Rectangle(SKETCH40_W, SKETCH40_H)
    extrude(amount=BOSS_EXTRUDE18_DEPTH)

    # Sketch41 → Boss-Extrude19 (add)
    with BuildSketch(Plane(origin=(0, 0, 0), x_dir=(1, 0, 0), z_dir=(0, 1, 0)).offset(BOSS_EXTRUDE19_START)):
        Polygon((-45.5, -65), (-53, -65), (-55, -67), (-55, -93), (-53, -95), (-45.5, -95), align=None)
        Polygon((45.5, -95), (53, -95), (55, -93), (55, -67), (53, -65), (45.5, -65), align=None)
    extrude(amount=BOSS_EXTRUDE19_DEPTH)

    # Split1 4 outline → Split1 4 (cut)
    with BuildSketch(Plane(origin=(0, 0, 0), x_dir=(1, 0, 0), z_dir=(0, 1, 0)).offset(SPLIT1_START)):
        Polygon((27, 29.706664121), (27, 95.999820088), (-27, 95.999820088), (-27, 29.706664121), (-45, 4), (-45, -37.554930795), (-55, -59), (-55, -93), (-53, -95), (53, -95), (55, -93), (55, -59), (45, -37.554930795), (45, 4), align=None)
    extrude(amount=SPLIT1_4_DEPTH, mode=Mode.SUBTRACT)

    # Split1 5 outline → Split1 5 (cut)
    with BuildSketch(Plane(origin=(0, 0, 0), x_dir=(1, 0, 0), z_dir=(0, 1, 0)).offset(SPLIT1_START_2)):
        Polygon((55, -93), (55, -67), (53, -65), (45.5, -65), (45.5, -95), (53, -95), align=None)
        Polygon((-53, -65), (-55, -67), (-55, -93), (-53, -95), (-45.5, -95), (-45.5, -65), align=None)
    extrude(amount=SPLIT1_5_DEPTH, mode=Mode.SUBTRACT)

    # Sketch43 → Boss-Extrude20 (add)
    with BuildSketch(Plane.XZ):
        Polygon((35.9, -14.996146861), (38.9, -10.711702841), (38.9, -12.711702841), (35.9, -16.996146861), align=None)
    extrude(amount=-BOSS_EXTRUDE20_DEPTH)

    # Sketch45 → CSK for M3 SFHCS1 (revolve, cut)
    with BuildSketch(Plane(origin=(50.5, 0, 91), x_dir=(0, 0, -1), z_dir=(1, 0, 0))):
        Polygon((0, 0), (0, 32), (1.6, 31.03862301), (1.6, 1.76), (3.36, 0), align=None)
    csk_for_m3_sfhcs1 = revolve(axis=Axis((50.5, -6.35, 91), (0, 1, 0)), mode=Mode.SUBTRACT)

    # CSK for M3 SFHCS1 at 2: CSK for M3 SFHCS1 ×2
    with Locations(*[(0, 0, -i * CSK_FOR_M3_SFHCS1_AT_2_PITCH) for i in range(1, CSK_FOR_M3_SFHCS1_AT_2_COUNT)]):
        add(csk_for_m3_sfhcs1, mode=Mode.SUBTRACT)

    # CSK for M3 SFHCS1 at 3: CSK for M3 SFHCS1 ×2
    with Locations(*[Vector(-0.9770889695769172, 0, -0.21283126069992253) * (i * CSK_FOR_M3_SFHCS1_AT_3_PITCH) for i in range(1, CSK_FOR_M3_SFHCS1_AT_3_COUNT)]):
        add(csk_for_m3_sfhcs1, mode=Mode.SUBTRACT)

    # CSK for M3 SFHCS1 at 4: CSK for M3 SFHCS1 ×2
    with Locations(*[(-i * CSK_FOR_M3_SFHCS1_AT_4_PITCH, 0, 0) for i in range(1, CSK_FOR_M3_SFHCS1_AT_4_COUNT)]):
        add(csk_for_m3_sfhcs1, mode=Mode.SUBTRACT)


with BuildPart() as body_2_2:
    # Split1 outline → Split1 (new body)
    with BuildSketch(Plane(origin=(0, 0, 0), x_dir=(1, 0, 0), z_dir=(0, 1, 0)).offset(SPLIT1_START)):
        Polygon((-53, -95), (53, -95), (55, -93), (55, -59), (45, -37.554930795), (45, 4), (27, 29.706664121), (27, 95.999820088), (-27, 95.999820088), (-27, 29.706664121), (-45, 4), (-45, -37.554930795), (-55, -59), (-55, -93), align=None)
    extrude(amount=SPLIT1_DEPTH)

    # Split1 2 outline → Split1 2 (add)
    with BuildSketch(Plane(origin=(0, 0, 0), x_dir=(1, 0, 0), z_dir=(0, 1, 0)).offset(SPLIT1_START_2)):
        Polygon((-45.5, -95), (-45.5, -65), (-53, -65), (-55, -67), (-55, -93), (-53, -95), align=None)
        Polygon((45.5, -65), (45.5, -95), (53, -95), (55, -93), (55, -67), (53, -65), align=None)
    extrude(amount=SPLIT1_2_DEPTH)

    # Split1 3 outline → Split1 3 (add)
    with BuildSketch(Plane(origin=(0, 0, 0), x_dir=(1, 0, 0), z_dir=(0, 1, 0)).offset(SPLIT1_START_3)):
        Polygon((-53, -95), (53, -95), (55, -93), (55, -59), (45, -37.554930795), (45, 4), (27, 29.706664121), (27, 95.999820088), (-27, 95.999820088), (-27, 29.706664121), (-45, 4), (-45, -37.554930795), (-55, -59), (-55, -93), align=None)
        Polygon((-52.171572875, -93), (-53, -92.171572875), (-53, -59.443389325), (-43, -37.99832012), (-43, 3.369402422), (-25, 29.076066544), (-25, 93.999820088), (25, 93.999820088), (25, 29.076066544), (43, 3.369402422), (43, -37.99832012), (53, -59.443389325), (53, -92.171572875), (52.171572875, -93), align=None, mode=Mode.SUBTRACT)
    extrude(amount=SPLIT1_3_DEPTH)


solid = Compound([part_1.part, body_2_2.part])
